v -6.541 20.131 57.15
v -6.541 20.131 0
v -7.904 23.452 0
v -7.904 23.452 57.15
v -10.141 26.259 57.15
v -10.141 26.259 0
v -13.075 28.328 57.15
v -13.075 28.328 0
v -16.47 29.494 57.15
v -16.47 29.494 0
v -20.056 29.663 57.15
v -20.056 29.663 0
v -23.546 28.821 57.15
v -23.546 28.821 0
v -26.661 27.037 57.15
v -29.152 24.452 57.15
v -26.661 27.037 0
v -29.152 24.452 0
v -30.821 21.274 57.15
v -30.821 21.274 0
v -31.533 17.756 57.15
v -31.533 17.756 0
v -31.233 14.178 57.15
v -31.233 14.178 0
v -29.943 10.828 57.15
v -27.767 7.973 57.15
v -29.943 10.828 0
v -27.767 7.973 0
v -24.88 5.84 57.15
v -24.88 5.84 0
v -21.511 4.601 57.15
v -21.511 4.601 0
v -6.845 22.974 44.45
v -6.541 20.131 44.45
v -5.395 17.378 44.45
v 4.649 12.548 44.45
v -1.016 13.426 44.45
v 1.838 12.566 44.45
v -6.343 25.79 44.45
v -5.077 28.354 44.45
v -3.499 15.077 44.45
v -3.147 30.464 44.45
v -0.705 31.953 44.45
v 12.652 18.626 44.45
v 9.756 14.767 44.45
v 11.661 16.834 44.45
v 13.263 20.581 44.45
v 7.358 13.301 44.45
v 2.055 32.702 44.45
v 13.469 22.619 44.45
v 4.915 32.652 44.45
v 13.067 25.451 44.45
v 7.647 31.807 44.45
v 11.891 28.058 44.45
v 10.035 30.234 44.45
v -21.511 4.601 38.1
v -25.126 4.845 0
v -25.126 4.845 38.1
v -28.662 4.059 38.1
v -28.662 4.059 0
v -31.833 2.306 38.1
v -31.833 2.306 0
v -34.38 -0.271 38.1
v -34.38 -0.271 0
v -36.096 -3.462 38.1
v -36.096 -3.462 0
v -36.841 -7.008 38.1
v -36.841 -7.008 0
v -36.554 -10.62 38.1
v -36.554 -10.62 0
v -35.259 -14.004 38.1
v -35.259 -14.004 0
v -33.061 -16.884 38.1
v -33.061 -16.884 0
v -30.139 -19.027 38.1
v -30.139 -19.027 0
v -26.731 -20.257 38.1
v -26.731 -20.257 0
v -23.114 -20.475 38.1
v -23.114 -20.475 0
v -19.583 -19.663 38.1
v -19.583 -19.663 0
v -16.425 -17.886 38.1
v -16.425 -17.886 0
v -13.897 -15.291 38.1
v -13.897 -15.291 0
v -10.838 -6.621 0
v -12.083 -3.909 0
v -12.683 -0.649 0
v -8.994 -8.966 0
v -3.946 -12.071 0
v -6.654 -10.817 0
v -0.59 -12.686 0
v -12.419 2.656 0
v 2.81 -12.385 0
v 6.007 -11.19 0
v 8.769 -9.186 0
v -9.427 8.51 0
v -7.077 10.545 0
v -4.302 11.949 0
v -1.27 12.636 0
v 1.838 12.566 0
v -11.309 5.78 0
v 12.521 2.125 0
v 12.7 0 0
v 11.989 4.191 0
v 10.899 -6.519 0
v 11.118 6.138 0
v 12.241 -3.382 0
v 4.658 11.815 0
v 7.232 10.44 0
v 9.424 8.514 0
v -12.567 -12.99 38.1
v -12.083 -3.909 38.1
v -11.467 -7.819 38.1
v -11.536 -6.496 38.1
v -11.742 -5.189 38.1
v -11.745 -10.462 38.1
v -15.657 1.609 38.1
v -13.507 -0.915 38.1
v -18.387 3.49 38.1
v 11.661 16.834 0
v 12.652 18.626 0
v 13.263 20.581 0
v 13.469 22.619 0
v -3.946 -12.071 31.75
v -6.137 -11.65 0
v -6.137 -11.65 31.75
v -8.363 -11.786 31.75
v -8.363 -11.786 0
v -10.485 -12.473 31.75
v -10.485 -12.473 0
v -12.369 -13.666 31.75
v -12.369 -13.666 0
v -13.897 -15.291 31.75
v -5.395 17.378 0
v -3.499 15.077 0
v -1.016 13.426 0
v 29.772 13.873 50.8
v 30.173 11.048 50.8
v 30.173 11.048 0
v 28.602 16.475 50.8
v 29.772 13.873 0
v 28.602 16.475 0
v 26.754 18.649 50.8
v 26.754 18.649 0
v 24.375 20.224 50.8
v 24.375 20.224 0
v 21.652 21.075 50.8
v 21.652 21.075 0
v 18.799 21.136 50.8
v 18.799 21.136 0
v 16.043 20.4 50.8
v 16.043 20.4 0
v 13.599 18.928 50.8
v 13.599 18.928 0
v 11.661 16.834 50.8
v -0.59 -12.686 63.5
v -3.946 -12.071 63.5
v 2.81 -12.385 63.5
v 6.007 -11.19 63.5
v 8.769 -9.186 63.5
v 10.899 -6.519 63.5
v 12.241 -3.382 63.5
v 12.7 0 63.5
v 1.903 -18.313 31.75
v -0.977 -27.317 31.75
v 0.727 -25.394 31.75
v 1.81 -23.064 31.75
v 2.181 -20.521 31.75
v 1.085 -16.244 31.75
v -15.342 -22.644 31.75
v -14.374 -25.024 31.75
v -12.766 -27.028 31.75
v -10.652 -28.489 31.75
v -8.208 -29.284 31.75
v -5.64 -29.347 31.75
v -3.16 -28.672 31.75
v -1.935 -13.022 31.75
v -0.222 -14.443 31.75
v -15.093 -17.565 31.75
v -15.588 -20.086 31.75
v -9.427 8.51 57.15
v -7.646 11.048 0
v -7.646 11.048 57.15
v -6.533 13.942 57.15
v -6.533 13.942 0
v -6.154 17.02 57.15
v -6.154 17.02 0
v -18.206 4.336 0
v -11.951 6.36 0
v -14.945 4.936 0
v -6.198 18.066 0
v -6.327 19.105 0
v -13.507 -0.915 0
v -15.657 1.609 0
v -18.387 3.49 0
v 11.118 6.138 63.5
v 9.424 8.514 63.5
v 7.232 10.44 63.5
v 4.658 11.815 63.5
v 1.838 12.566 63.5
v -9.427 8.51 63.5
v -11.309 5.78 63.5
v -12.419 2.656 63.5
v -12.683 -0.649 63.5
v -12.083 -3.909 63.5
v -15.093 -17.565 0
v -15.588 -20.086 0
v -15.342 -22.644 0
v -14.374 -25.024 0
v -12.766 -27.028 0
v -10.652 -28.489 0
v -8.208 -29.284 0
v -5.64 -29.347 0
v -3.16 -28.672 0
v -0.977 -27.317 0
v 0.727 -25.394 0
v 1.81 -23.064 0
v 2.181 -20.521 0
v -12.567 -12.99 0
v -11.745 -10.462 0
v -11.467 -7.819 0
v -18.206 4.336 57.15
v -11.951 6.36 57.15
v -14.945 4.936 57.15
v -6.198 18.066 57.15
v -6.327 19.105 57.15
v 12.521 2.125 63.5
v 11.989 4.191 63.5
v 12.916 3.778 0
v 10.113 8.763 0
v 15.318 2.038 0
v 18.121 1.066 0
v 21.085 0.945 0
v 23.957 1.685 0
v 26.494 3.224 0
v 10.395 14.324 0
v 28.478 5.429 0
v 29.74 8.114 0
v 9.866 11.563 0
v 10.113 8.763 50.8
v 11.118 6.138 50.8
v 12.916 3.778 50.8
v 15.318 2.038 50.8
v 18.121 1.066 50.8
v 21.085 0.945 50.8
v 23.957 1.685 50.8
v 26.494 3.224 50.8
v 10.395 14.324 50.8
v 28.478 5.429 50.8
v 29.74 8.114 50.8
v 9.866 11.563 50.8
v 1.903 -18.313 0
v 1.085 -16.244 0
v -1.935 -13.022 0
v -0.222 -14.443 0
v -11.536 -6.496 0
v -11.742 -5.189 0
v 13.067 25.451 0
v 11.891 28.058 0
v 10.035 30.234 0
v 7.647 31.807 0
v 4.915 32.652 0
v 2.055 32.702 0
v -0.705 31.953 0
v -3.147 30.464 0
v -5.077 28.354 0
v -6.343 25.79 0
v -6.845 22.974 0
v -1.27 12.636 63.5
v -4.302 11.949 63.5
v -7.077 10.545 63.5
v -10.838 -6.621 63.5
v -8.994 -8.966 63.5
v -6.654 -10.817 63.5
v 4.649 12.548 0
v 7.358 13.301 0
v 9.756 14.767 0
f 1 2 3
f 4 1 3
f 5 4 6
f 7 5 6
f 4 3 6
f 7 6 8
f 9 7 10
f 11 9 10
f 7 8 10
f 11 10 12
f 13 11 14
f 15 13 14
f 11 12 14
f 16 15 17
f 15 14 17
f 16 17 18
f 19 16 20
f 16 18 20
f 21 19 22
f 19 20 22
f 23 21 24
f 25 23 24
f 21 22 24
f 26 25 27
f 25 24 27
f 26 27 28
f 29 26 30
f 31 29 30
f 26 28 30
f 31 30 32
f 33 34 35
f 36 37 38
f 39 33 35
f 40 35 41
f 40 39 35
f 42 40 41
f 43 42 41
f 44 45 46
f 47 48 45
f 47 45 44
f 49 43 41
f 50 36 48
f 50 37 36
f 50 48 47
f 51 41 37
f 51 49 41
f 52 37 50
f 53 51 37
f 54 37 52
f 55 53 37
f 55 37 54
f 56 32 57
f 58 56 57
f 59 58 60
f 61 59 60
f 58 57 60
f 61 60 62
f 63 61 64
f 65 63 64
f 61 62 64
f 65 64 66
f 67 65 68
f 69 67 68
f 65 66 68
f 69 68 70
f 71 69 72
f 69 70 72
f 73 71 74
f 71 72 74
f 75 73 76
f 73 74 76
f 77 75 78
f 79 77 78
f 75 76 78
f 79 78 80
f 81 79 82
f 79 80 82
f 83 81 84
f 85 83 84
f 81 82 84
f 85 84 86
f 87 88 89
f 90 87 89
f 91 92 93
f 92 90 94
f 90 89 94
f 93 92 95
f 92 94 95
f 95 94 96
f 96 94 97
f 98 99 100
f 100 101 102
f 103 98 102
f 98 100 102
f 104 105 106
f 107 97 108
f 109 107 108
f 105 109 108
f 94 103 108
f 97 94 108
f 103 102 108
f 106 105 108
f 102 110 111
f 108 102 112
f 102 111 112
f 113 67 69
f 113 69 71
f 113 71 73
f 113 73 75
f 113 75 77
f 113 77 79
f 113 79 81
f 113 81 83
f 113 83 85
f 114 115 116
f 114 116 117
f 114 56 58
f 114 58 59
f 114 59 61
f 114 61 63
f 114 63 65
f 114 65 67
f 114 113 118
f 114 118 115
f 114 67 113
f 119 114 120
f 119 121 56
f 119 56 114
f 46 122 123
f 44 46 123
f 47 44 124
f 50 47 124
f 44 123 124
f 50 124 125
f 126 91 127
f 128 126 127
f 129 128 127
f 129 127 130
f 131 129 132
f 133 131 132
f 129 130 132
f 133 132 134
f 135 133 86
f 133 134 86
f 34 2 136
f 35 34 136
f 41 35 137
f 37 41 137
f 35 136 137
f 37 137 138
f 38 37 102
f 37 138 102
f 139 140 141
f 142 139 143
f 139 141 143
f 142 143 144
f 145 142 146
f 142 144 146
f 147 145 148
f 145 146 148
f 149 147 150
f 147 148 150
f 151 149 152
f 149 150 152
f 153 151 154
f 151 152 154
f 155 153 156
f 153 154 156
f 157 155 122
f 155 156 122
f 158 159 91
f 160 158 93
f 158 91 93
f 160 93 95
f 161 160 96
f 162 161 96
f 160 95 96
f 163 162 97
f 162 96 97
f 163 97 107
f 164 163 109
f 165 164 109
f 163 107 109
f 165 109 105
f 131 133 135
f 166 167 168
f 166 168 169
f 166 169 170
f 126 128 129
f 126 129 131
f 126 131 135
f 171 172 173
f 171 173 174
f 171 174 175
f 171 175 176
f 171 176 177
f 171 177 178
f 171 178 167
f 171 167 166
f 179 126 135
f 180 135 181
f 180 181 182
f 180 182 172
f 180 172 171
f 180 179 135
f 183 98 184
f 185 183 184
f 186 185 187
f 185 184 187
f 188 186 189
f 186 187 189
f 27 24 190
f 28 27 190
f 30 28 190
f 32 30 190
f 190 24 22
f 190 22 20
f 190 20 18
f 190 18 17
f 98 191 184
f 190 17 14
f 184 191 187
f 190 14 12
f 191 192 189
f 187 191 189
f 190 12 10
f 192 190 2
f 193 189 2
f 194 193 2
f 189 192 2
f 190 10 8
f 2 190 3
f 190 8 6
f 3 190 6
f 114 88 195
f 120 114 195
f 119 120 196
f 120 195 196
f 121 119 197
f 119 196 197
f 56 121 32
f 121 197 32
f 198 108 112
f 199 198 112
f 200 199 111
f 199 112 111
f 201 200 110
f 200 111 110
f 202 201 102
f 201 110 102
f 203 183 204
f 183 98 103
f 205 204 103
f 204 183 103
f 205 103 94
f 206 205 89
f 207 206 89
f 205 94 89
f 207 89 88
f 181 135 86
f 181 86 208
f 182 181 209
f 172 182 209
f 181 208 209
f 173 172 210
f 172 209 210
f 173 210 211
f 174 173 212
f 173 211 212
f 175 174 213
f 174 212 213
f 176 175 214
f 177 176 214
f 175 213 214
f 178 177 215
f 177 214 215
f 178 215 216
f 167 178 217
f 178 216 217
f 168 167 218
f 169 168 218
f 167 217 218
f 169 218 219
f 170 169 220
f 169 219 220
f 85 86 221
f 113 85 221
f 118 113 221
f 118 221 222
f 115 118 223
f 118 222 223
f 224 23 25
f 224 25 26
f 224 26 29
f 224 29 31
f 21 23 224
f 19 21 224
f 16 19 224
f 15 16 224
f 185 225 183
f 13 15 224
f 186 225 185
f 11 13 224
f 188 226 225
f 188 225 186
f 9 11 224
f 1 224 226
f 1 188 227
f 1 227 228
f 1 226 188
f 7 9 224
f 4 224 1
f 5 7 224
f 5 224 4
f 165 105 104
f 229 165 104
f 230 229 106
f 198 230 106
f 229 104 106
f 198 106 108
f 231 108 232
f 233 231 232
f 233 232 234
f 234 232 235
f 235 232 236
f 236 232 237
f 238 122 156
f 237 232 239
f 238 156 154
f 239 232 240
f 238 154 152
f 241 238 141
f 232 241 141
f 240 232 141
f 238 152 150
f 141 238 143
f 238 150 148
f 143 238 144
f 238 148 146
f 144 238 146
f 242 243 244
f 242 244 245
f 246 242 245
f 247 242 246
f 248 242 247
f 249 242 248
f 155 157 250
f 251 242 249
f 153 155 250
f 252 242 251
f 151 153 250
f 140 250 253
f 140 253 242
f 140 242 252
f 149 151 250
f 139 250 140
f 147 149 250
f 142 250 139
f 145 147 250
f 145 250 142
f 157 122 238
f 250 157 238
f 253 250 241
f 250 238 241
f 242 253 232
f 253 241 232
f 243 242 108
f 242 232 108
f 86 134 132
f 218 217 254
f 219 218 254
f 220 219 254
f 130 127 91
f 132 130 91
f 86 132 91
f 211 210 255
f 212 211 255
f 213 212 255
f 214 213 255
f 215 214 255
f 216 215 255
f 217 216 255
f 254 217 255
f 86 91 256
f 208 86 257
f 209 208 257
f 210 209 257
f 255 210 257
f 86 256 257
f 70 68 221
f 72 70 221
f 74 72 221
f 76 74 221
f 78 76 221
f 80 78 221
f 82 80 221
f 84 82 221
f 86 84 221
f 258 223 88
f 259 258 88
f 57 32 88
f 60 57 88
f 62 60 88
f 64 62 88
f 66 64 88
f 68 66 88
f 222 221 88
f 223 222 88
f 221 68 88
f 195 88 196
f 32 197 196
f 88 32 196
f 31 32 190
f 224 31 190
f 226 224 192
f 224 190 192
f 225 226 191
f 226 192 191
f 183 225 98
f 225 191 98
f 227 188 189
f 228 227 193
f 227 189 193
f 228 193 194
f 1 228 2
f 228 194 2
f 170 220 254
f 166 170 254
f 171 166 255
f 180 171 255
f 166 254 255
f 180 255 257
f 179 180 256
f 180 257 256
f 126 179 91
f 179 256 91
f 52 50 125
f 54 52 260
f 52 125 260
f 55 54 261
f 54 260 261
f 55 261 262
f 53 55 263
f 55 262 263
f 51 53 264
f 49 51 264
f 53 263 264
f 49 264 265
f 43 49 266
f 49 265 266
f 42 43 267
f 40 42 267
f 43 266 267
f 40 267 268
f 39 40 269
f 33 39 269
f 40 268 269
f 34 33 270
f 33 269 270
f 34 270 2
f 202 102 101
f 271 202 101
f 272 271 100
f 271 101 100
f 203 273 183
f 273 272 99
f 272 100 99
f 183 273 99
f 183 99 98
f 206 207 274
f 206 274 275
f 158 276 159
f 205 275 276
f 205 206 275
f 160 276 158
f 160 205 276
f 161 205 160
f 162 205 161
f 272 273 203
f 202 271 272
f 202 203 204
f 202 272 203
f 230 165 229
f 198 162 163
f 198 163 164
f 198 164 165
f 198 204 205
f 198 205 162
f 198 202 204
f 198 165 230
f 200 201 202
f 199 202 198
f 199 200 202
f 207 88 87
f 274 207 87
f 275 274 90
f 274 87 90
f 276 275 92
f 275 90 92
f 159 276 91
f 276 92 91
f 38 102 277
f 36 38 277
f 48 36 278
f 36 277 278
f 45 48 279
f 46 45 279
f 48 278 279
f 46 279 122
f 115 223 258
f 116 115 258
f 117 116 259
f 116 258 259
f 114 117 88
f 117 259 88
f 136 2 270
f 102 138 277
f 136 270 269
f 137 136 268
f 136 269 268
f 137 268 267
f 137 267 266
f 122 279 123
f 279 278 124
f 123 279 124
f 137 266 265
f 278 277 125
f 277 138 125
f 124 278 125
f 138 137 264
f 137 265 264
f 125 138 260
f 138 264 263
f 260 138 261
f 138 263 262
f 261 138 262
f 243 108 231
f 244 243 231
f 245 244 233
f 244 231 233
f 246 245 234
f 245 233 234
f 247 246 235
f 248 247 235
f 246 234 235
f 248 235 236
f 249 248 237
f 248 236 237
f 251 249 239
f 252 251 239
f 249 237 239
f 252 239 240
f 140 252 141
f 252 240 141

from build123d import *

# Parameters (mm, degrees)
F1_DEPTH = 63.5
F2_DEPTH = 57.15
F3_DEPTH = 38.1
F4_DEPTH = 44.45
F5_DEPTH = 50.8
F6_DEPTH = 31.75


with BuildPart() as f1:
    # F0 (on Top) → F1 (new body)
    with BuildSketch(Plane.XY):
        with BuildLine():
            ThreePointArc((-3.946422, -12.071278), (7.455549, -10.281283), (12.7, 0))
            ThreePointArc((12.7, 0), (12.298209, 3.169237), (11.118258, 6.137942))
            ThreePointArc((11.118258, 6.137942), (7.231833, 10.439856), (1.838386, 12.566238))
            ThreePointArc((1.838386, 12.566238), (-4.302478, 11.949004), (-9.427243, 8.509823))
            ThreePointArc((-9.427243, 8.509823), (-12.419143, 2.656102), (-12.083345, -3.90932))
            ThreePointArc((-12.083345, -3.90932), (-8.994039, -8.966452), (-3.946422, -12.071278))
        make_face()
    extrude(amount=F1_DEPTH)

    # F0 (on Top) → F2 (join)
    with BuildSketch(Plane.XY):
        with BuildLine():
            ThreePointArc((-21.510587, 4.600503), (-14.945166, 4.936302), (-9.427243, 8.509823))
            ThreePointArc((-9.427243, 8.509823), (-7.000879, 12.460918), (-6.154486, 17.019647))
            ThreePointArc((-6.154486, 17.019647), (-6.251582, 18.58707), (-6.541386, 20.130525))
            ThreePointArc((-6.541386, 20.130525), (-27.998325, 25.833284), (-21.510587, 4.600503))
        make_face()
    extrude(amount=F2_DEPTH)


with BuildPart() as f3:
    # F0 (on Top) → F3 (new body)
    with BuildSketch(Plane.XY):
        with BuildLine():
            ThreePointArc((-11.466689, -7.81864), (-11.6218, -5.839812), (-12.083345, -3.90932))
            ThreePointArc((-12.083345, -3.90932), (-15.656866, 1.608603), (-21.510587, 4.600503))
            ThreePointArc((-21.510587, 4.600503), (-36.027613, -12.358296), (-13.897412, -15.290718))
            ThreePointArc((-13.897412, -15.290718), (-12.089649, -11.747392), (-11.466689, -7.81864))
        make_face()
    extrude(amount=F3_DEPTH)


with BuildPart() as f4:
    # F0 (on Top) → F4 (new body)
    with BuildSketch(Plane.XY):
        with BuildLine():
            ThreePointArc((-6.541386, 20.130525), (-3.498764, 15.077434), (1.838386, 12.566238))
            ThreePointArc((1.838386, 12.566238), (7.357624, 13.300698), (11.66098, 16.833763))
            ThreePointArc((11.66098, 16.833763), (13.006536, 19.588515), (13.469094, 22.619228))
            ThreePointArc((13.469094, 22.619228), (2.055156, 32.701551), (-6.541386, 20.130525))
        make_face()
    extrude(amount=F4_DEPTH)


with BuildPart() as f5:
    # F0 (on Top) → F5 (new body)
    with BuildSketch(Plane.XY):
        with BuildLine():
            ThreePointArc((11.66098, 16.833763), (9.865919, 11.563167), (11.118258, 6.137942))
            ThreePointArc((11.118258, 6.137942), (22.548254, 1.209729), (30.172864, 11.048296))
            ThreePointArc((30.172864, 11.048296), (23.043578, 20.745738), (11.66098, 16.833763))
        make_face()
    extrude(amount=F5_DEPTH)


with BuildPart() as f6:
    # F0 (on Top) → F6 (new body)
    with BuildSketch(Plane.XY):
        with BuildLine():
            ThreePointArc((2.181082, -20.521172), (0.48798, -15.302288), (-3.946422, -12.071278))
            ThreePointArc((-3.946422, -12.071278), (-9.445442, -12.062831), (-13.897412, -15.290718))
            ThreePointArc((-13.897412, -15.290718), (-9.459044, -28.975101), (2.181082, -20.521172))
        make_face()
    extrude(amount=F6_DEPTH)


solid = Compound([f1.part, f3.part, f4.part, f5.part, f6.part])
